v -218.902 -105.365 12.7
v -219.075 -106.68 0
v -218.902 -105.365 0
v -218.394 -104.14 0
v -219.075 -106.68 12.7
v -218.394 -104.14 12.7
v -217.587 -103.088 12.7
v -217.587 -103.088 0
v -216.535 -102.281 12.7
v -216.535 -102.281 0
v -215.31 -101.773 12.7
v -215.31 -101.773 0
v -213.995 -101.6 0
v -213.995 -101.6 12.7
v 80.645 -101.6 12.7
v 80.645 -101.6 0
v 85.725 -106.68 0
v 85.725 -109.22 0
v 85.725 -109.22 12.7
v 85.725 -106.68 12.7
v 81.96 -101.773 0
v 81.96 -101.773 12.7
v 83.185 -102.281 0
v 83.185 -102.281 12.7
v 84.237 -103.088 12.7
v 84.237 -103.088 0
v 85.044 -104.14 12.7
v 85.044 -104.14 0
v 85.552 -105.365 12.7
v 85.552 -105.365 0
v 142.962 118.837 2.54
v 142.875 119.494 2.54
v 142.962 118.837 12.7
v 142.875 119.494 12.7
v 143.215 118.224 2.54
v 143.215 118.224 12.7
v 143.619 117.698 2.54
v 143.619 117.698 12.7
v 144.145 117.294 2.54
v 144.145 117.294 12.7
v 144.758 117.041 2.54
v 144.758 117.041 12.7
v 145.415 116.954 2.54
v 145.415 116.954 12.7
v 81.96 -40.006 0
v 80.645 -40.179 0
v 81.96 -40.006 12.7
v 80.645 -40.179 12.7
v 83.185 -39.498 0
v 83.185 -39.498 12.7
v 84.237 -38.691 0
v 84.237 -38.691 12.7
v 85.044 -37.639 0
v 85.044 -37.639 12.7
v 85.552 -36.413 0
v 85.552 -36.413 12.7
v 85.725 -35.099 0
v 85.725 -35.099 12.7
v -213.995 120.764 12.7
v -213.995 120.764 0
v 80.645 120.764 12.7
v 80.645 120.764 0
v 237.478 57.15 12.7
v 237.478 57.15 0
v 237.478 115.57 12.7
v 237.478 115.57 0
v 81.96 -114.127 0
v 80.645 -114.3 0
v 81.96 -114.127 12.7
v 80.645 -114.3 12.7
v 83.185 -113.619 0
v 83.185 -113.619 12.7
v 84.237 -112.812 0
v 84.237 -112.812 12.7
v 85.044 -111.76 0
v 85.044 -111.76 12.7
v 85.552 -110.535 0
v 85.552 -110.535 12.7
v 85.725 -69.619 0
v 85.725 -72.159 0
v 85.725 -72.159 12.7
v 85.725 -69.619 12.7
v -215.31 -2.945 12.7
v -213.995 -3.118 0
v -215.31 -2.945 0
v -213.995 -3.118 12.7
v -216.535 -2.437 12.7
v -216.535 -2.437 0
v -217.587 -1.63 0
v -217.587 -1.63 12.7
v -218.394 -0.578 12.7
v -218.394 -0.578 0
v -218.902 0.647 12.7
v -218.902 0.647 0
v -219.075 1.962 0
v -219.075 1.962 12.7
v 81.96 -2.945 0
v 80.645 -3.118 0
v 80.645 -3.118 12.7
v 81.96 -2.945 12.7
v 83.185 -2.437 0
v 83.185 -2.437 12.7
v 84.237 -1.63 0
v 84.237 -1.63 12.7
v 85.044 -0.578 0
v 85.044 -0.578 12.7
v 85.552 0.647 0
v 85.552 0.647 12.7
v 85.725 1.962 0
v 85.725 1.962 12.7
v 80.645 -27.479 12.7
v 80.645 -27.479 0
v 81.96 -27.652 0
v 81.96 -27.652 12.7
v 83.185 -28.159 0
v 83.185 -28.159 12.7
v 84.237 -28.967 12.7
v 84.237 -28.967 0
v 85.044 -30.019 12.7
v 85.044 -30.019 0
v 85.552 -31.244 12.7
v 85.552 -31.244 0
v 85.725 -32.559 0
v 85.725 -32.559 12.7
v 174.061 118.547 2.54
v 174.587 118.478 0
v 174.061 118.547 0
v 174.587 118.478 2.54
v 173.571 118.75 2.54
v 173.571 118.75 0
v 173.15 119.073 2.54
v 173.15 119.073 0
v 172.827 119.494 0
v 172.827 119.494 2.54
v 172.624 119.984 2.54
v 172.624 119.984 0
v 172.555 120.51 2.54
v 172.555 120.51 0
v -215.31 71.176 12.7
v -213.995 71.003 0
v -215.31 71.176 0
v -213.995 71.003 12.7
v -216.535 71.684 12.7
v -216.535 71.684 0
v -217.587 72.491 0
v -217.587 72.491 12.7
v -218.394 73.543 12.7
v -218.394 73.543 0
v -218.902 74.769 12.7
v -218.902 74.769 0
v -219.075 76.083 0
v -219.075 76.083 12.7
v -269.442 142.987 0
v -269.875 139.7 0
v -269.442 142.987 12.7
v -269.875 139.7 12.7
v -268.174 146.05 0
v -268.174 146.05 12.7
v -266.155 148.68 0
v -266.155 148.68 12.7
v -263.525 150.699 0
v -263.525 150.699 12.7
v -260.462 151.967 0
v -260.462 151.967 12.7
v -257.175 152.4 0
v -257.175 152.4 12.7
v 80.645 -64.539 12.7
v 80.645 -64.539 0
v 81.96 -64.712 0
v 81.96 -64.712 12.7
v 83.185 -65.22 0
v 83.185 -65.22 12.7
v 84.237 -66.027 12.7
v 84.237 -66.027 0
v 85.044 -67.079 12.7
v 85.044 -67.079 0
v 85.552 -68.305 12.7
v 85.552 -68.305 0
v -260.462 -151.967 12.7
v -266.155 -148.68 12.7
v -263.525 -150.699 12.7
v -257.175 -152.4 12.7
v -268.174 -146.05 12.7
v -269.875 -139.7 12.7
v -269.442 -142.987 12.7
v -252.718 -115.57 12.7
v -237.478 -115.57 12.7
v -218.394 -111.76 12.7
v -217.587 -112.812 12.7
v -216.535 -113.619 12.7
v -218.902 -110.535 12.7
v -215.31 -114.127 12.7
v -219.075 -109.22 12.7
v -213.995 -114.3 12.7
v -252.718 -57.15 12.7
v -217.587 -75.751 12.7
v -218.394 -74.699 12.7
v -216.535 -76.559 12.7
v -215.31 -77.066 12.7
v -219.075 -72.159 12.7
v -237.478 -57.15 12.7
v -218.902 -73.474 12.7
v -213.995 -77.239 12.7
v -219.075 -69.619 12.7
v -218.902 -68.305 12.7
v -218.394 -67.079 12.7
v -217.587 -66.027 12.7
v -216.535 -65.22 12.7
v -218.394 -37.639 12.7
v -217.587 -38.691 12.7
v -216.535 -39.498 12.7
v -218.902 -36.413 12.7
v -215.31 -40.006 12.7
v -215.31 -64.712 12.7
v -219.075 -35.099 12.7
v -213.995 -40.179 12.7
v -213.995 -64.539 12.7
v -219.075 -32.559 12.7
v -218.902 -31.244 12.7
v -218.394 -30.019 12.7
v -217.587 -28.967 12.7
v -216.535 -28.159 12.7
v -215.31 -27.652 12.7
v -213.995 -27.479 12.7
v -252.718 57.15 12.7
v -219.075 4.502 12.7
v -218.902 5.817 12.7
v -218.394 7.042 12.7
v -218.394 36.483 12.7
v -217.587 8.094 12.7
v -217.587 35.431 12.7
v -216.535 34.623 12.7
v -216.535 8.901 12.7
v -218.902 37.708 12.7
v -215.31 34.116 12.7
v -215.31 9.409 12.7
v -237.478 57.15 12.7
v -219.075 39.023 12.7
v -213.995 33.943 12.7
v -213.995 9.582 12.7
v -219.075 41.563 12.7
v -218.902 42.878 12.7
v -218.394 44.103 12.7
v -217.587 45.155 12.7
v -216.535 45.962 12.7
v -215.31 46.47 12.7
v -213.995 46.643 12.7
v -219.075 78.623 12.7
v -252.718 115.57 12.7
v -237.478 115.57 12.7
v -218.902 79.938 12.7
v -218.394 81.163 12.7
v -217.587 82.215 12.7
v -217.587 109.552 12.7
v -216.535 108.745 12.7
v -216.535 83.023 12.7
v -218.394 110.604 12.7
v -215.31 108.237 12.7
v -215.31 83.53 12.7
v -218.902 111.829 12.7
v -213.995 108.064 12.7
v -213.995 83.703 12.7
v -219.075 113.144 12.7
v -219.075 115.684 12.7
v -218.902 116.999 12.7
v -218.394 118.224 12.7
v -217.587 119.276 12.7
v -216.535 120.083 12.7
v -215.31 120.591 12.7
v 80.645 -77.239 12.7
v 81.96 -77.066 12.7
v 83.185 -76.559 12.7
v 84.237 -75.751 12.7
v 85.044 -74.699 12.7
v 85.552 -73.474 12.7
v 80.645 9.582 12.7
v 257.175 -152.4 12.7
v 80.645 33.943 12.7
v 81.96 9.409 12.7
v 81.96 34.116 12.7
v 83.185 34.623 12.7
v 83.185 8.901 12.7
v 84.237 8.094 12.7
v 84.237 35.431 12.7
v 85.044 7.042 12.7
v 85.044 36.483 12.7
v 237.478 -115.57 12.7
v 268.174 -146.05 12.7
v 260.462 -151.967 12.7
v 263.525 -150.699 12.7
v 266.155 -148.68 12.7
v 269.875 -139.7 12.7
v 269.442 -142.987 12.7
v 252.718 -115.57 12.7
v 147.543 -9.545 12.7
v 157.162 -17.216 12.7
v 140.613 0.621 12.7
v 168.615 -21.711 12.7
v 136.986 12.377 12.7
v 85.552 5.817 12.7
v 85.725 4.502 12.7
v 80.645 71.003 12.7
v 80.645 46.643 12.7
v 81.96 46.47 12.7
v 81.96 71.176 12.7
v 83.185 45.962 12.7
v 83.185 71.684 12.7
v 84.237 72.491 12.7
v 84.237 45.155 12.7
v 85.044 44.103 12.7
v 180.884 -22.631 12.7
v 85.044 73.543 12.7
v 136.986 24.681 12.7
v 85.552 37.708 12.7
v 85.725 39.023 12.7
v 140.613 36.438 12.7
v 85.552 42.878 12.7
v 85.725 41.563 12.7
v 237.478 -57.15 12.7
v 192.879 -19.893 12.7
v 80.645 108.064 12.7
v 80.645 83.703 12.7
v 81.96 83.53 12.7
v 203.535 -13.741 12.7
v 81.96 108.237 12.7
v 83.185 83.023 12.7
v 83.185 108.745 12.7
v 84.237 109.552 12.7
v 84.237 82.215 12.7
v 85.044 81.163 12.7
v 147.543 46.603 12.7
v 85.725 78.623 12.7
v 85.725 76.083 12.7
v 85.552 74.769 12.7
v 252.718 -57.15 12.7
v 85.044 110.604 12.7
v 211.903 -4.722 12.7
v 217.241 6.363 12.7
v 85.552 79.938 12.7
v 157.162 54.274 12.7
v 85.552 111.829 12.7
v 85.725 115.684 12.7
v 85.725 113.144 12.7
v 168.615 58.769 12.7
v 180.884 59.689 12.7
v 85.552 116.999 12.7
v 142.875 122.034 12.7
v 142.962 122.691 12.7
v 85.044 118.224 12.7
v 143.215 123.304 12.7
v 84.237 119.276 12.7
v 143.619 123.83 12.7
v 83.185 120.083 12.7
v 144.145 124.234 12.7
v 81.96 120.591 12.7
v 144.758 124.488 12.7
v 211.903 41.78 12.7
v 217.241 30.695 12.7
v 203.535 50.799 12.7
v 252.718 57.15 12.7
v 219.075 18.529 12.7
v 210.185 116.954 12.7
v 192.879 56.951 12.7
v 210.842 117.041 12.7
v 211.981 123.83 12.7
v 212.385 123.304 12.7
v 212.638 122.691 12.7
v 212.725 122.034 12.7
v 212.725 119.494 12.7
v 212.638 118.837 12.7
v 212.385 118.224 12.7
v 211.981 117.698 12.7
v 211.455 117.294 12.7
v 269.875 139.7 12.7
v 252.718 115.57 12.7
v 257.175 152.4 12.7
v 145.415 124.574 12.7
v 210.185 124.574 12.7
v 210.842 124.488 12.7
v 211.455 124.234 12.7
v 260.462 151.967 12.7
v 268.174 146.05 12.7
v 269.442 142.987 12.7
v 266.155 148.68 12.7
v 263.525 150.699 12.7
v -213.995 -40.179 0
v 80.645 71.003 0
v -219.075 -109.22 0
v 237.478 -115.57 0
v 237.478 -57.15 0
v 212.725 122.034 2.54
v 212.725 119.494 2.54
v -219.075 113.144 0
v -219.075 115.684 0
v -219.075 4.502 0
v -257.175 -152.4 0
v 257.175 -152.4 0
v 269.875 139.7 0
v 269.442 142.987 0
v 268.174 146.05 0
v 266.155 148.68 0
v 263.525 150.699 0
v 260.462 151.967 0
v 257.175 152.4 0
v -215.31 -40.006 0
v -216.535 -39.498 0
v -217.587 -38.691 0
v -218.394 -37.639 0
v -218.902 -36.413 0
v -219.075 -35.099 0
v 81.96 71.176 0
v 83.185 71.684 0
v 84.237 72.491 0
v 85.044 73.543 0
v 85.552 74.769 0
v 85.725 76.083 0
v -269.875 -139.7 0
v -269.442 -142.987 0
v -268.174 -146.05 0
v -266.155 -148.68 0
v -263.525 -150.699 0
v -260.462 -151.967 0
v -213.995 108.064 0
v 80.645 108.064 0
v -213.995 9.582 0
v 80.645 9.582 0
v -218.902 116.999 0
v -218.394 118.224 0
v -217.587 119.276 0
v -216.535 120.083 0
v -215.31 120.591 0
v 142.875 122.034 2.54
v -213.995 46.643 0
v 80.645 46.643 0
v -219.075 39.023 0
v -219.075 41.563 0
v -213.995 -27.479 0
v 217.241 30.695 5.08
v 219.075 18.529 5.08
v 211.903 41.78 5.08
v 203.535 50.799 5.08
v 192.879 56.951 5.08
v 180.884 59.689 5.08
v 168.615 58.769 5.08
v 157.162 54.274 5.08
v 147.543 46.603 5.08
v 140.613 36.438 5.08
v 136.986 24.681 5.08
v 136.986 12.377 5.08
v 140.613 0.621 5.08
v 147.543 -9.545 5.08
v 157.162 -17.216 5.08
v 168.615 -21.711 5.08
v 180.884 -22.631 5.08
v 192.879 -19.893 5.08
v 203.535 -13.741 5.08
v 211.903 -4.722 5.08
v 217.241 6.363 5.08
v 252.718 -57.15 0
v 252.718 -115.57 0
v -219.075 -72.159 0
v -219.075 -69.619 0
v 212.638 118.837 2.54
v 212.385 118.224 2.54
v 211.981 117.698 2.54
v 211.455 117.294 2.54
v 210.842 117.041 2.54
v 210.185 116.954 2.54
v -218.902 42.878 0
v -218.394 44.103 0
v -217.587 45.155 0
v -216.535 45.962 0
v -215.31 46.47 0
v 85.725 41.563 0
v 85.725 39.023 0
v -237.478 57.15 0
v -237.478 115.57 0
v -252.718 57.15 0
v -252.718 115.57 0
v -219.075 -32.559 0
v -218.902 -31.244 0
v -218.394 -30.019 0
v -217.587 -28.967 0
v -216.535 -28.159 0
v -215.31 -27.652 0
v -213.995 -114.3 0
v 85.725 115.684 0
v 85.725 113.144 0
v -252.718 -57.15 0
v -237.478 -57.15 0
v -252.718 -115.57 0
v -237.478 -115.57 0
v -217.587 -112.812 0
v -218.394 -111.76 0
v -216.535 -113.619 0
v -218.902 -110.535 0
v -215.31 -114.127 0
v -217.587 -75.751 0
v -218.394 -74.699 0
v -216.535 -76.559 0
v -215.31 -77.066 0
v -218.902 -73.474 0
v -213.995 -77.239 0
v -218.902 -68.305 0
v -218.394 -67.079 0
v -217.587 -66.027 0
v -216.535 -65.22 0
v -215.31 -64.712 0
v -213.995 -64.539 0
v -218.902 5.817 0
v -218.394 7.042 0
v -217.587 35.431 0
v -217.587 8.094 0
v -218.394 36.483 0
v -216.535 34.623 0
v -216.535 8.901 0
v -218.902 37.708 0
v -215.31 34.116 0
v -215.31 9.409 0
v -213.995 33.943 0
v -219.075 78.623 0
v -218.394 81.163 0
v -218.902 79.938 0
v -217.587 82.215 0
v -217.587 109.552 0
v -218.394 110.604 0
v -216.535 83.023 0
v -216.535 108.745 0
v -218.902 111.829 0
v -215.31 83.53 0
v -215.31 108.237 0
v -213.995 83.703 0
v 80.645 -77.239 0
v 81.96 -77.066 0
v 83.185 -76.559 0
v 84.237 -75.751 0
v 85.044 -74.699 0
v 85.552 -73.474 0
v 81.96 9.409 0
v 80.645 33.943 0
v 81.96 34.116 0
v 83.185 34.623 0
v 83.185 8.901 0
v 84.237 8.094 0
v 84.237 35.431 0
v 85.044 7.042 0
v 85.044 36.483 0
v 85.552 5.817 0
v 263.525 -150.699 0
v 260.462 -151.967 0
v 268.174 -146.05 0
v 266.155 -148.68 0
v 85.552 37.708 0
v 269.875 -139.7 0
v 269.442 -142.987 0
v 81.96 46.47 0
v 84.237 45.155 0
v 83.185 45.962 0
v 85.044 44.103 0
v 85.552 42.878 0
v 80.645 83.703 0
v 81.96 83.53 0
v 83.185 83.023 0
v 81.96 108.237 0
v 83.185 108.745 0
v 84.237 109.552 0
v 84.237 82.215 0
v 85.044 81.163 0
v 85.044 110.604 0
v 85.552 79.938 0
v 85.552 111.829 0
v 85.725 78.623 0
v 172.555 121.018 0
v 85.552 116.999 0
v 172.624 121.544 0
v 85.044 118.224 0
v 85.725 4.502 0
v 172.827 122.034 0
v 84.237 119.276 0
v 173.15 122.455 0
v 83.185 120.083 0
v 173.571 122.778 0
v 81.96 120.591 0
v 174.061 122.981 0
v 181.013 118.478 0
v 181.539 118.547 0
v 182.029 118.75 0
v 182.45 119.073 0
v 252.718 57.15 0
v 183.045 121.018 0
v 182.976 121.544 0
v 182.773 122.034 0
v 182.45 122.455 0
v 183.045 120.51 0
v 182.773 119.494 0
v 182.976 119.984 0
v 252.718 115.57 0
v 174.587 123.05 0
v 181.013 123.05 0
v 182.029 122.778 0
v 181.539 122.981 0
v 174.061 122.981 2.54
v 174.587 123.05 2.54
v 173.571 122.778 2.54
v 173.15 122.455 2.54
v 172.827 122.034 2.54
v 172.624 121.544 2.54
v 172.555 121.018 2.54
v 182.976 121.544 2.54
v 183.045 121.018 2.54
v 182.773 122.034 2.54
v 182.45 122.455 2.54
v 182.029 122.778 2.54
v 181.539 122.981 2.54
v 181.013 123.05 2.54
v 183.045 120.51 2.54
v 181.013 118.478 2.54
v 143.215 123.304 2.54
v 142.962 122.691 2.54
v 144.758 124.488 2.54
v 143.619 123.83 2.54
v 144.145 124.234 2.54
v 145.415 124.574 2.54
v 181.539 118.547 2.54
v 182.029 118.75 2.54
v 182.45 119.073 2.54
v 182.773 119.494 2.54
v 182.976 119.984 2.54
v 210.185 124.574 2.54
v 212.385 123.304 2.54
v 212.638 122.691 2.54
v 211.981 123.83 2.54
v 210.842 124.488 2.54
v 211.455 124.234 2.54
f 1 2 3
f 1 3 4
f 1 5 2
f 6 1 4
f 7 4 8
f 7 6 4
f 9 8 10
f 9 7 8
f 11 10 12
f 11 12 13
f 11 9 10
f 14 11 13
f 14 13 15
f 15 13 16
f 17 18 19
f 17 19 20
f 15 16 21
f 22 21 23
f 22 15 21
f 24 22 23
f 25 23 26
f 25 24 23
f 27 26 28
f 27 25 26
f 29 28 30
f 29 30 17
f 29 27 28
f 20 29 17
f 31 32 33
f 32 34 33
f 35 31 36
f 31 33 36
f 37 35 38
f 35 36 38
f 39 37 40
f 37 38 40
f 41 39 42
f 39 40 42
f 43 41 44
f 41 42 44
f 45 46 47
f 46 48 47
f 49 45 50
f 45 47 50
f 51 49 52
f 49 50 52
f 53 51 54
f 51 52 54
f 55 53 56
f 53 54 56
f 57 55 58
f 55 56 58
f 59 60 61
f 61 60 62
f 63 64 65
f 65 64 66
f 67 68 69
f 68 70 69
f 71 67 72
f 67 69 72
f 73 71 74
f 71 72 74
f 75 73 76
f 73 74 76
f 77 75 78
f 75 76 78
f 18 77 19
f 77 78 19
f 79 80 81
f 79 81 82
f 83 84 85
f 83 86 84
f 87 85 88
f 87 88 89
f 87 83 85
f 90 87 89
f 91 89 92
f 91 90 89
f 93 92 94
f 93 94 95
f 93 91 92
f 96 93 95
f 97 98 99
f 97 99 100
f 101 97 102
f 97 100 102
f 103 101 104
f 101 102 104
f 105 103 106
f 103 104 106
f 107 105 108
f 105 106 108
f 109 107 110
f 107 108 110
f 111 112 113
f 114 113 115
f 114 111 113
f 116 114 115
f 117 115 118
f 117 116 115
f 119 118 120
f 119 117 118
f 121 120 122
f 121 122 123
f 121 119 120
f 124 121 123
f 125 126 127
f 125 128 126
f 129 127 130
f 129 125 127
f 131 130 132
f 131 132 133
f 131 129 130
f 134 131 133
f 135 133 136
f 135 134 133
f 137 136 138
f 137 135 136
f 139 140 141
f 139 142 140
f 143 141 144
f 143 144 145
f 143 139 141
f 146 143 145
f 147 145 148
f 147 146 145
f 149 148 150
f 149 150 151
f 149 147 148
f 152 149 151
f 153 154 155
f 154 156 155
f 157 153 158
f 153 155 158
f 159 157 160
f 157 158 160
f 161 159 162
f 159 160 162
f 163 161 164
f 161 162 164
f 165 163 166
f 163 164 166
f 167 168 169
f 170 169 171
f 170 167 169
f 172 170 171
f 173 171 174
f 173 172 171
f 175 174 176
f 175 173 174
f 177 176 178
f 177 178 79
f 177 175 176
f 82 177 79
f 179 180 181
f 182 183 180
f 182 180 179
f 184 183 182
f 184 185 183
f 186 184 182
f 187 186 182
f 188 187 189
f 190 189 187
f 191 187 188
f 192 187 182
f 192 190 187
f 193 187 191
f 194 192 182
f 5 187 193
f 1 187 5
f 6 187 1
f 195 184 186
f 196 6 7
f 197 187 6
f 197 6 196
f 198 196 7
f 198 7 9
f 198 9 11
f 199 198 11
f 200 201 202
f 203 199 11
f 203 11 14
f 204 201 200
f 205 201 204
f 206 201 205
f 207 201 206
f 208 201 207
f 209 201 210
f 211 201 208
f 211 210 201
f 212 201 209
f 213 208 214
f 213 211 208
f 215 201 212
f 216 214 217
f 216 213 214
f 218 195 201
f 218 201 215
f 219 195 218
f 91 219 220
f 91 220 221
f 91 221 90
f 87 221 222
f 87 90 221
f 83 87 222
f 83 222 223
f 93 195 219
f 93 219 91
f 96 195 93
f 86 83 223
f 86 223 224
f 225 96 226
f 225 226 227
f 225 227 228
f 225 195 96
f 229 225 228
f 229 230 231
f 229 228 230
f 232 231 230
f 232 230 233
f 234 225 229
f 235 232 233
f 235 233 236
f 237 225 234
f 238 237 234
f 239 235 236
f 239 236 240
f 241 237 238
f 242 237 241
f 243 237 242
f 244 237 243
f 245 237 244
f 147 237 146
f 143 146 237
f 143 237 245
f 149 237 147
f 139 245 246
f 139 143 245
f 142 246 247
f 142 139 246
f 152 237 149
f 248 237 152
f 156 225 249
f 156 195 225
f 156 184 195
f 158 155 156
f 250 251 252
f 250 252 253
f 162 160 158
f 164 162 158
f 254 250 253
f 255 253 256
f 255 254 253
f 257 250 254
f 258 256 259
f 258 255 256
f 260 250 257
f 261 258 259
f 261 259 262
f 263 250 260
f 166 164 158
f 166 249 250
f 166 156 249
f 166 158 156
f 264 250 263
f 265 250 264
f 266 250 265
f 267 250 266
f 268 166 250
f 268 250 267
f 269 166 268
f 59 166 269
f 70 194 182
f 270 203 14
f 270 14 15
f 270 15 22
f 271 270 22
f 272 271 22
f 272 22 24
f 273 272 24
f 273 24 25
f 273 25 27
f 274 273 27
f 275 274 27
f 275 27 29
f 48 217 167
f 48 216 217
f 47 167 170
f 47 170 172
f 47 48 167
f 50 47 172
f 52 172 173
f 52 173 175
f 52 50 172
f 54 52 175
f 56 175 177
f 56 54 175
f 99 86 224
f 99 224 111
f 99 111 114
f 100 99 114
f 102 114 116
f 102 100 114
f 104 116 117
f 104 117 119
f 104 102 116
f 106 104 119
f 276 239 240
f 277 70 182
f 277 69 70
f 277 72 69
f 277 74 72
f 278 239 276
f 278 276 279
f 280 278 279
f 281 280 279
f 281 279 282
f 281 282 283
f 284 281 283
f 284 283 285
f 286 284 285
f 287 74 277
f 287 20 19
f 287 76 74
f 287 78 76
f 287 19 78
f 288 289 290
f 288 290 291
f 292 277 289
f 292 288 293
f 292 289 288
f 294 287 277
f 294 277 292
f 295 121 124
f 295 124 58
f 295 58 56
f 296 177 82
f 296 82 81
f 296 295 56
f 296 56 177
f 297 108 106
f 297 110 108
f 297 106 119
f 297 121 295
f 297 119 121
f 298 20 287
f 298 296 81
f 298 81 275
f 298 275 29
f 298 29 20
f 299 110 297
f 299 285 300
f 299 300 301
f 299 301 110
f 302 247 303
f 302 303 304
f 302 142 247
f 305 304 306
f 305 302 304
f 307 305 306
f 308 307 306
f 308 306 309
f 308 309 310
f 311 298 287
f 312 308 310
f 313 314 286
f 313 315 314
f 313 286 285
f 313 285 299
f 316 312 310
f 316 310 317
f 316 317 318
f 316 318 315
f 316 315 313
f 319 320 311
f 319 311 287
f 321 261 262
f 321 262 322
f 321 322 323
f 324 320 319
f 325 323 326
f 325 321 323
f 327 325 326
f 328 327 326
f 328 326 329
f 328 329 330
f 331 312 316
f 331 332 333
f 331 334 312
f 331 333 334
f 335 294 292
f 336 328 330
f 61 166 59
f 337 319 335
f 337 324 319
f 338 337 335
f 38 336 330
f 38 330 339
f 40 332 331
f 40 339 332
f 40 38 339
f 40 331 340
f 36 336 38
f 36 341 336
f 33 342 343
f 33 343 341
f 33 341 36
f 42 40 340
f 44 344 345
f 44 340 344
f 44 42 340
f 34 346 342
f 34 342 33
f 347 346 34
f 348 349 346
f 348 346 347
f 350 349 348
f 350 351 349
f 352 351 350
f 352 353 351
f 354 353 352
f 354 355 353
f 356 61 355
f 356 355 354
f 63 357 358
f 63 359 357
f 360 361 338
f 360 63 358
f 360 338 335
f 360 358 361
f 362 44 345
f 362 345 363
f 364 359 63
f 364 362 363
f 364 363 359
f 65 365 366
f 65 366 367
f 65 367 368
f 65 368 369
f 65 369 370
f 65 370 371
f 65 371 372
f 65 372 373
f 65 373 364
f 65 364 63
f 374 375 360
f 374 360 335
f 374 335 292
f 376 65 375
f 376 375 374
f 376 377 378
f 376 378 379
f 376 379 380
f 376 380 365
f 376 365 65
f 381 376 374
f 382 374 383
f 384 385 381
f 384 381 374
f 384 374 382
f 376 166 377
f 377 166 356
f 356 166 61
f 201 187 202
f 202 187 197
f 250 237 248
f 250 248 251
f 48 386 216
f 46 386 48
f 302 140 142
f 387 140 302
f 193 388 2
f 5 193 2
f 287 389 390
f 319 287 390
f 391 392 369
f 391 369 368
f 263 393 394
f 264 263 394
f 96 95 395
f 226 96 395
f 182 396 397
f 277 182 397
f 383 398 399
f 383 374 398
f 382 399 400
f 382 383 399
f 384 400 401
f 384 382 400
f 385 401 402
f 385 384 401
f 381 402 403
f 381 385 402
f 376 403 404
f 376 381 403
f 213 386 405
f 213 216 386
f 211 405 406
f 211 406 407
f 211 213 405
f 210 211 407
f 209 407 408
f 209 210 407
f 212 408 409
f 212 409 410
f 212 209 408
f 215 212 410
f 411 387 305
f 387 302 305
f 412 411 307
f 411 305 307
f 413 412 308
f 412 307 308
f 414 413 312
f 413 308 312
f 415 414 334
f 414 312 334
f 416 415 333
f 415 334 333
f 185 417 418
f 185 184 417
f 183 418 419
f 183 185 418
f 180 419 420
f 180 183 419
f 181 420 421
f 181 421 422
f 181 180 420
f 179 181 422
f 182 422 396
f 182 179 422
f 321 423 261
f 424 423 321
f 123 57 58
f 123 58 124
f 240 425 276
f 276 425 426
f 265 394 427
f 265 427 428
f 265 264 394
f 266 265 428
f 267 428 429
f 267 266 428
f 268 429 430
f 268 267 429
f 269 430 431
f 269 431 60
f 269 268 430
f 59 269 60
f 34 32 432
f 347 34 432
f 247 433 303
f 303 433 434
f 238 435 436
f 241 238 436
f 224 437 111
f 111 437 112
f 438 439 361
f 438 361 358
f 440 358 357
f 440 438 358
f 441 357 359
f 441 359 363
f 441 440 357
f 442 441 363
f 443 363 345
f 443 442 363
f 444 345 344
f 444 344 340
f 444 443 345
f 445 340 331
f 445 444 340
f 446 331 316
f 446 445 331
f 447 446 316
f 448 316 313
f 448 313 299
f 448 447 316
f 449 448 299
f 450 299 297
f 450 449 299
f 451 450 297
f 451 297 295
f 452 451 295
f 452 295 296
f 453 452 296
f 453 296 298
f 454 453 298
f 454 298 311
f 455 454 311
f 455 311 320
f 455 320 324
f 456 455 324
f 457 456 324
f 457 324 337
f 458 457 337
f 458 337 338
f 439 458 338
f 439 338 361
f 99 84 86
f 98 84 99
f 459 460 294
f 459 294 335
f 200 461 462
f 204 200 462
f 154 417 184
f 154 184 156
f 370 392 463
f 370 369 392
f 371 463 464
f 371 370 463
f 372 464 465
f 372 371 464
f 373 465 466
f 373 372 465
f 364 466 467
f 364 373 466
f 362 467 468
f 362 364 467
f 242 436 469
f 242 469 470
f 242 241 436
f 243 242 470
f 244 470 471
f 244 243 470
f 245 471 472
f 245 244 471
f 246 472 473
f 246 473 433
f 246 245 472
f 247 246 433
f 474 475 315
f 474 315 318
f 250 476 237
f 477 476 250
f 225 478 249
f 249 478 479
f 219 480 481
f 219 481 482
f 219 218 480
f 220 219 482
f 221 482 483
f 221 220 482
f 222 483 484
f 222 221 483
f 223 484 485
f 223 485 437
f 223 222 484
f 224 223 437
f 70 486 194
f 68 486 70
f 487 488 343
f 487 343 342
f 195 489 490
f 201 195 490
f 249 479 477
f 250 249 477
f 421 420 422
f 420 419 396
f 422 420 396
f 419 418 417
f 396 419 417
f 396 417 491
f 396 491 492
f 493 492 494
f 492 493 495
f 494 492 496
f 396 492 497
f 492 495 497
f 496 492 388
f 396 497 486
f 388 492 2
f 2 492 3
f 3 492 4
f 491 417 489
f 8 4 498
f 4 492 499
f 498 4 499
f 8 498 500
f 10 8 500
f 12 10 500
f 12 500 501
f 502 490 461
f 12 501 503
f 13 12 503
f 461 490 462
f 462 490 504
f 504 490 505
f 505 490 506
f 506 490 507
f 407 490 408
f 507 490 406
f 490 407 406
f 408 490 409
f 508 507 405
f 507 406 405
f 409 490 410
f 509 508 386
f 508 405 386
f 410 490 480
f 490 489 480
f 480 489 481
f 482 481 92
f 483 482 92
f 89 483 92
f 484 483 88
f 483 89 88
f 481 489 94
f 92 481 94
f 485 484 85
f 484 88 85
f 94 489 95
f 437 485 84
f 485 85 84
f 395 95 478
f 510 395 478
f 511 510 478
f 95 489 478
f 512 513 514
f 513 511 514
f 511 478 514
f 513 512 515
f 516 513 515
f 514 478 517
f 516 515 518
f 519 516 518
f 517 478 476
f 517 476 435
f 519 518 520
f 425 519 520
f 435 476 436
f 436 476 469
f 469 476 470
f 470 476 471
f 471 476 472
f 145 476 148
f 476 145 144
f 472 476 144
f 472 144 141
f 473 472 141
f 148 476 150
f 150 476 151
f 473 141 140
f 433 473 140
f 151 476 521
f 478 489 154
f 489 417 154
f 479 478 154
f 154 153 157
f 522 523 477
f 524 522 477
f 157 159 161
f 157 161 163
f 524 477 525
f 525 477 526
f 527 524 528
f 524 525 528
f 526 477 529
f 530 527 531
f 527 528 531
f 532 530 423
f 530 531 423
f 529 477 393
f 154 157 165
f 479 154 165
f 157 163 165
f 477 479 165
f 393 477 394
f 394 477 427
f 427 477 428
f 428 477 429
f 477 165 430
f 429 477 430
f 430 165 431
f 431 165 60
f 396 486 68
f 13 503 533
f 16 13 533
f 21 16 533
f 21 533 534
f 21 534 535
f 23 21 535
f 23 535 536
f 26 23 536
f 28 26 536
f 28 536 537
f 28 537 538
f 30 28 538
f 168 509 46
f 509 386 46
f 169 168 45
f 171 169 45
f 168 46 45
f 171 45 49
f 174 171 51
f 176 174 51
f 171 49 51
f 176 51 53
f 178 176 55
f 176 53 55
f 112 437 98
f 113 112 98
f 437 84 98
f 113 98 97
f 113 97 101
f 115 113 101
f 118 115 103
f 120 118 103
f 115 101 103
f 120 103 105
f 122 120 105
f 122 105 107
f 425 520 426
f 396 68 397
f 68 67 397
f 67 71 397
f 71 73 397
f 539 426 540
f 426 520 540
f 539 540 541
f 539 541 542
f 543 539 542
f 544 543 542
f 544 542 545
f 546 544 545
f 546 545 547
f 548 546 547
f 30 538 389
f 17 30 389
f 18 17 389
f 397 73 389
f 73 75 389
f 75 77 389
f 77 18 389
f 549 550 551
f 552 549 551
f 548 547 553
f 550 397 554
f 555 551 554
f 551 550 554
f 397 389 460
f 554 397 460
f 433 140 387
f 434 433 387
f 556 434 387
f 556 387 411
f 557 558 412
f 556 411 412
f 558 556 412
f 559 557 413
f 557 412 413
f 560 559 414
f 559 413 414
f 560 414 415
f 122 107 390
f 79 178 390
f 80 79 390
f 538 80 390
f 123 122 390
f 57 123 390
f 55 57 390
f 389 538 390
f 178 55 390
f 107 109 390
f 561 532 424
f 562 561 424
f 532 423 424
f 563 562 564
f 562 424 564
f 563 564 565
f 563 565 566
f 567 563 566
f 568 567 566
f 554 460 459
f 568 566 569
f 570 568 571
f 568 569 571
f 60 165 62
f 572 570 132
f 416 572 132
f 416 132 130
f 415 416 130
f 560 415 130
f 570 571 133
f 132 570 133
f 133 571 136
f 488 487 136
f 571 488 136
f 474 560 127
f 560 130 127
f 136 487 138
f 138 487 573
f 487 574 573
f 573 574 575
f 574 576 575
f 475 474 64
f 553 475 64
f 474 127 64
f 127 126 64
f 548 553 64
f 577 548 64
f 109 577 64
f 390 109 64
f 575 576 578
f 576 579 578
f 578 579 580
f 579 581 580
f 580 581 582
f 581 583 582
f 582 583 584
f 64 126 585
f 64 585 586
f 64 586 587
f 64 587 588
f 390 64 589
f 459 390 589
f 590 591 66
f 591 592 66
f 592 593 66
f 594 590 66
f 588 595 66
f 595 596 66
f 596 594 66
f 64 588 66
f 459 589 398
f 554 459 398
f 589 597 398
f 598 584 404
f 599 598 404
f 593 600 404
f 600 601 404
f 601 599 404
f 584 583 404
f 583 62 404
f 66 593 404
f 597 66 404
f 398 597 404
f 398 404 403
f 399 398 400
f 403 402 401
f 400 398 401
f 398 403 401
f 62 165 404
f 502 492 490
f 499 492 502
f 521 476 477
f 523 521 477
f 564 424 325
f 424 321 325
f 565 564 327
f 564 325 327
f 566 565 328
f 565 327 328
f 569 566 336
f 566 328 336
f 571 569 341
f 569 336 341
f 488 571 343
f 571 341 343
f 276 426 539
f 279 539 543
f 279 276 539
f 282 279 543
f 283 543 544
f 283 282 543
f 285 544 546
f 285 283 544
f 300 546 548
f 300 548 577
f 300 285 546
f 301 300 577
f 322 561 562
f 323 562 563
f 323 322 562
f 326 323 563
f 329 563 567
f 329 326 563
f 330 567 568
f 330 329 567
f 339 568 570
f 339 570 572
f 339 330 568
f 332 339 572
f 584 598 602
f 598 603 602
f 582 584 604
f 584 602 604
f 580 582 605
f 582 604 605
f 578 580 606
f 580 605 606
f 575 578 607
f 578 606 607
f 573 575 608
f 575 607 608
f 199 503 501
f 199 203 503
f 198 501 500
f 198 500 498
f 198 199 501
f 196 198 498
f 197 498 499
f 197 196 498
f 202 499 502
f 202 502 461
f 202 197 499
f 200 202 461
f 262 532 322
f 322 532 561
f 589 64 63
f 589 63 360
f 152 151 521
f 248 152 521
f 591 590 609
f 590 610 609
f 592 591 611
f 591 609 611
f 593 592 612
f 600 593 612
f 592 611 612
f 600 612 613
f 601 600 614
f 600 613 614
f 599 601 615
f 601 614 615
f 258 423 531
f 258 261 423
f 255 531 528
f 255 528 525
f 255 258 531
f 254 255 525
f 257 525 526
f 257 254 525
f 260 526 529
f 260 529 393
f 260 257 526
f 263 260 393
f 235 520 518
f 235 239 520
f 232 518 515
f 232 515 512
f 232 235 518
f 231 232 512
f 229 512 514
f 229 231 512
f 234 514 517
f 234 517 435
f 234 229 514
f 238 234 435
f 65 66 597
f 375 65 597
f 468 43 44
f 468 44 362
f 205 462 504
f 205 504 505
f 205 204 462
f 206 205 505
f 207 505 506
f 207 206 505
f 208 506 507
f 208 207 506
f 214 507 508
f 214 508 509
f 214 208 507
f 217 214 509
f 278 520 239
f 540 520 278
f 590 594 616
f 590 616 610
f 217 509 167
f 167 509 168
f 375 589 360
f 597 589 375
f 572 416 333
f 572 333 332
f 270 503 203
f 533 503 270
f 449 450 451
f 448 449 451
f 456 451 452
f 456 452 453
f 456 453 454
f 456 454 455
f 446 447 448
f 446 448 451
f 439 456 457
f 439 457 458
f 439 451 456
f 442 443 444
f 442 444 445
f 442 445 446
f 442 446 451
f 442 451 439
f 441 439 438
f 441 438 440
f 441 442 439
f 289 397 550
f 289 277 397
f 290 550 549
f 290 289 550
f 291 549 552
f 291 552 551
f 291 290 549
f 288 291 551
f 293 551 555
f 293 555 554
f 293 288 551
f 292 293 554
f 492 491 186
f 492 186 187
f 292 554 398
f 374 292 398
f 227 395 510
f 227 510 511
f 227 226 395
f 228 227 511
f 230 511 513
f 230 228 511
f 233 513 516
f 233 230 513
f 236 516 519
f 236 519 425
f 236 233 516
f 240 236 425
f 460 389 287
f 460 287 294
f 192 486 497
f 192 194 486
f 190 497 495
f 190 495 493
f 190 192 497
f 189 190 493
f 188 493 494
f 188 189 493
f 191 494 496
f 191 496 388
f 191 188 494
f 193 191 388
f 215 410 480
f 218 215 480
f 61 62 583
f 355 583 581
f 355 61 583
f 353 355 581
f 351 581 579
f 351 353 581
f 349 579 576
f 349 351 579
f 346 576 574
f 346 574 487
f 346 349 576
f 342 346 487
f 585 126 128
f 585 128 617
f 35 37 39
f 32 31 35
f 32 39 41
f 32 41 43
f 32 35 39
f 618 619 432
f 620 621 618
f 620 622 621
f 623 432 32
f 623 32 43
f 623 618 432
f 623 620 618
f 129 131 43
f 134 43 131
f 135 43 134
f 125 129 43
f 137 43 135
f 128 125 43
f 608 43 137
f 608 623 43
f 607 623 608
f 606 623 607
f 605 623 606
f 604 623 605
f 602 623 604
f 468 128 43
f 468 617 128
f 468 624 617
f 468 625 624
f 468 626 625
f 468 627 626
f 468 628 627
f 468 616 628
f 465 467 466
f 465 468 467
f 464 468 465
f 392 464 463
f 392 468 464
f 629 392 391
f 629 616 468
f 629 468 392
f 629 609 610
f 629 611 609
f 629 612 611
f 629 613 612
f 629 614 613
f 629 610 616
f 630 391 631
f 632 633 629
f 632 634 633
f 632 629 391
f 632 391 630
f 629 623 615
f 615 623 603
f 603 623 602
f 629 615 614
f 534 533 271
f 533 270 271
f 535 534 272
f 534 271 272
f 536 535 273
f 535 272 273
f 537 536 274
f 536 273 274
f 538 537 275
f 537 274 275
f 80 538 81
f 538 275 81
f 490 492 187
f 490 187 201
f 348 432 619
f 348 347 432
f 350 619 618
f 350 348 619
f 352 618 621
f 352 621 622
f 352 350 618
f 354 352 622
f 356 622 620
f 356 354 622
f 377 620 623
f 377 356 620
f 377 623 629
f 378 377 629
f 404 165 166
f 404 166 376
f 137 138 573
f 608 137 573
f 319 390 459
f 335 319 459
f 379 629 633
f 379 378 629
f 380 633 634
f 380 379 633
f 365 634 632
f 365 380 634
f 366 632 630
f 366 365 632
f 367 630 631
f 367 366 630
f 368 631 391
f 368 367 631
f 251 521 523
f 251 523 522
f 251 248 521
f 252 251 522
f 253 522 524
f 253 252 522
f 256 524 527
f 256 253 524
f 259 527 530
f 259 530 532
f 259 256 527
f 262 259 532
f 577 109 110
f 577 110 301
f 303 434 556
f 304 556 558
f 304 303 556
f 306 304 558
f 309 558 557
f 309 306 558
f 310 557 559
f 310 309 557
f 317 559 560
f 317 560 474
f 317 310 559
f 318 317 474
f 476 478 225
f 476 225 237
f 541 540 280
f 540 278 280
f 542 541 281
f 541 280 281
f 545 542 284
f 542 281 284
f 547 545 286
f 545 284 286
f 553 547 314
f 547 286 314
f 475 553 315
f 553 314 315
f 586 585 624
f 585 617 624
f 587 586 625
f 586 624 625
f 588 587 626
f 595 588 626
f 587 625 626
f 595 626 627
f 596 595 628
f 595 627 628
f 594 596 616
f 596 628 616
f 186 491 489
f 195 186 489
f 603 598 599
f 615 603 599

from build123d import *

# Parameters (mm, degrees)
F0_W     = 539.75
F0_H     = 304.8
F0_W_2   = 15.24
F0_H_2   = 58.42
F0_W_3   = 304.8
F0_H_3   = 12.7
F0_R     = 47.625
F0_W_4   = 69.85
F0_H_4   = 7.62
F1_DEPTH = 12.7
F0_W_5   = 10.4902
F0_H_5   = 4.572
F2_DEPTH = 2.54
F0_R_2   = 41.275
F3_DEPTH = 12.7
F4_DEPTH = 5.08
F5_R     = 12.7
F6_R     = 5.08
F7_R     = 2.54
F8_R     = 2.032


with BuildPart() as f1:
    # F0 (on Top) → F1 (new body)
    with BuildSketch(Plane.XY):
        Rectangle(F0_W, F0_H)
        with Locations((-245.098478, -86.36)):
            Rectangle(F0_W_2, F0_H_2, mode=Mode.SUBTRACT)
        with Locations((-66.675, -107.95)):
            Rectangle(F0_W_3, F0_H_3, mode=Mode.SUBTRACT)
        with Locations((-66.675, -70.889322)):
            Rectangle(F0_W_3, F0_H_3, mode=Mode.SUBTRACT)
        with Locations((-66.675, -33.828645)):
            Rectangle(F0_W_3, F0_H_3, mode=Mode.SUBTRACT)
        with Locations((245.098478, -86.36)):
            Rectangle(F0_W_2, F0_H_2, mode=Mode.SUBTRACT)
        with Locations((-66.675, 3.232033)):
            Rectangle(F0_W_3, F0_H_3, mode=Mode.SUBTRACT)
        with Locations((-66.675, 40.292711)):
            Rectangle(F0_W_3, F0_H_3, mode=Mode.SUBTRACT)
        with Locations((-245.098478, 86.36)):
            Rectangle(F0_W_2, F0_H_2, mode=Mode.SUBTRACT)
        with Locations((-66.675, 77.353389)):
            Rectangle(F0_W_3, F0_H_3, mode=Mode.SUBTRACT)
        with Locations((-66.675, 114.414066)):
            Rectangle(F0_W_3, F0_H_3, mode=Mode.SUBTRACT)
        with Locations((177.8, 18.529066)):
            Circle(F0_R, mode=Mode.SUBTRACT)
        with Locations((245.098478, 86.36)):
            Rectangle(F0_W_2, F0_H_2, mode=Mode.SUBTRACT)
        with Locations((177.8, 120.764066)):
            Rectangle(F0_W_4, F0_H_4, mode=Mode.SUBTRACT)
    extrude(amount=F1_DEPTH)

    # F0 (on Top) → F2 (join)
    with BuildSketch(Plane.XY):
        with Locations((177.8, 120.764066)):
            Rectangle(F0_W_4, F0_H_4)
        with Locations((177.8, 120.764066)):
            Rectangle(F0_W_5, F0_H_5, mode=Mode.SUBTRACT)
    extrude(amount=F2_DEPTH)

    # F0 (on Top) → F3 (join)
    with BuildSketch(Plane.XY):
        with Locations((177.8, 18.529066)):
            Circle(F0_R)
        with Locations((177.8, 18.529066)):
            Circle(F0_R_2, mode=Mode.SUBTRACT)
    extrude(amount=F3_DEPTH)

    # F0 (on Top) → F4 (join)
    with BuildSketch(Plane.XY):
        with Locations((177.8, 18.529066)):
            Circle(F0_R_2)
    extrude(amount=F4_DEPTH)

    # F5
    f5_edges = [f1.edges().sort_by_distance(p)[0] for p in [
        (-269.875, 152.4, 6.35),
        (269.875, 152.4, 6.35),
        (269.875, -152.4, 6.35),
        (-269.875, -152.4, 6.35),
    ]]
    fillet(f5_edges, radius=F5_R)

    # F6
    f6_edges = [f1.edges().sort_by_distance(p)[0] for p in [
        (-219.075, 120.764066, 6.35),
        (85.725, 120.764066, 6.35),
        (-219.075, 33.942711, 6.35),
        (-219.075, -3.117967, 6.35),
        (-219.075, -40.178645, 6.35),
        (-219.075, -77.239322, 6.35),
        (-219.075, -114.3, 6.35),
        (-219.075, 108.064066, 6.35),
        (-219.075, 71.003389, 6.35),
        (85.725, 108.064066, 6.35),
        (85.725, 71.003389, 6.35),
        (85.725, 33.942711, 6.35),
        (85.725, -3.117967, 6.35),
        (85.725, -40.178645, 6.35),
        (85.725, -77.239322, 6.35),
        (85.725, -114.3, 6.35),
        (85.725, -101.6, 6.35),
        (85.725, -64.539322, 6.35),
        (85.725, -27.478645, 6.35),
        (85.725, 9.582033, 6.35),
        (85.725, 46.642711, 6.35),
        (85.725, 83.703389, 6.35),
        (-219.075, -101.6, 6.35),
        (-219.075, -64.539322, 6.35),
        (-219.075, -27.478645, 6.35),
        (-219.075, 9.582033, 6.35),
        (-219.075, 46.642711, 6.35),
        (-219.075, 83.703389, 6.35),
    ]]
    fillet(f6_edges, radius=F6_R)

    # F7
    f7_edges = [f1.edges().sort_by_distance(p)[0] for p in [
        (142.875, 124.574066, 7.62),
        (212.725, 124.574066, 7.62),
        (142.875, 116.954066, 7.62),
        (212.725, 116.954066, 7.62),
    ]]
    fillet(f7_edges, radius=F7_R)

    # F8
    f8_edges = [f1.edges().sort_by_distance(p)[0] for p in [
        (172.5549, 123.050066, 1.27),
        (183.0451, 123.050066, 1.27),
        (183.0451, 118.478066, 1.27),
        (172.5549, 118.478066, 1.27),
    ]]
    fillet(f8_edges, radius=F8_R)


solid = f1.part
